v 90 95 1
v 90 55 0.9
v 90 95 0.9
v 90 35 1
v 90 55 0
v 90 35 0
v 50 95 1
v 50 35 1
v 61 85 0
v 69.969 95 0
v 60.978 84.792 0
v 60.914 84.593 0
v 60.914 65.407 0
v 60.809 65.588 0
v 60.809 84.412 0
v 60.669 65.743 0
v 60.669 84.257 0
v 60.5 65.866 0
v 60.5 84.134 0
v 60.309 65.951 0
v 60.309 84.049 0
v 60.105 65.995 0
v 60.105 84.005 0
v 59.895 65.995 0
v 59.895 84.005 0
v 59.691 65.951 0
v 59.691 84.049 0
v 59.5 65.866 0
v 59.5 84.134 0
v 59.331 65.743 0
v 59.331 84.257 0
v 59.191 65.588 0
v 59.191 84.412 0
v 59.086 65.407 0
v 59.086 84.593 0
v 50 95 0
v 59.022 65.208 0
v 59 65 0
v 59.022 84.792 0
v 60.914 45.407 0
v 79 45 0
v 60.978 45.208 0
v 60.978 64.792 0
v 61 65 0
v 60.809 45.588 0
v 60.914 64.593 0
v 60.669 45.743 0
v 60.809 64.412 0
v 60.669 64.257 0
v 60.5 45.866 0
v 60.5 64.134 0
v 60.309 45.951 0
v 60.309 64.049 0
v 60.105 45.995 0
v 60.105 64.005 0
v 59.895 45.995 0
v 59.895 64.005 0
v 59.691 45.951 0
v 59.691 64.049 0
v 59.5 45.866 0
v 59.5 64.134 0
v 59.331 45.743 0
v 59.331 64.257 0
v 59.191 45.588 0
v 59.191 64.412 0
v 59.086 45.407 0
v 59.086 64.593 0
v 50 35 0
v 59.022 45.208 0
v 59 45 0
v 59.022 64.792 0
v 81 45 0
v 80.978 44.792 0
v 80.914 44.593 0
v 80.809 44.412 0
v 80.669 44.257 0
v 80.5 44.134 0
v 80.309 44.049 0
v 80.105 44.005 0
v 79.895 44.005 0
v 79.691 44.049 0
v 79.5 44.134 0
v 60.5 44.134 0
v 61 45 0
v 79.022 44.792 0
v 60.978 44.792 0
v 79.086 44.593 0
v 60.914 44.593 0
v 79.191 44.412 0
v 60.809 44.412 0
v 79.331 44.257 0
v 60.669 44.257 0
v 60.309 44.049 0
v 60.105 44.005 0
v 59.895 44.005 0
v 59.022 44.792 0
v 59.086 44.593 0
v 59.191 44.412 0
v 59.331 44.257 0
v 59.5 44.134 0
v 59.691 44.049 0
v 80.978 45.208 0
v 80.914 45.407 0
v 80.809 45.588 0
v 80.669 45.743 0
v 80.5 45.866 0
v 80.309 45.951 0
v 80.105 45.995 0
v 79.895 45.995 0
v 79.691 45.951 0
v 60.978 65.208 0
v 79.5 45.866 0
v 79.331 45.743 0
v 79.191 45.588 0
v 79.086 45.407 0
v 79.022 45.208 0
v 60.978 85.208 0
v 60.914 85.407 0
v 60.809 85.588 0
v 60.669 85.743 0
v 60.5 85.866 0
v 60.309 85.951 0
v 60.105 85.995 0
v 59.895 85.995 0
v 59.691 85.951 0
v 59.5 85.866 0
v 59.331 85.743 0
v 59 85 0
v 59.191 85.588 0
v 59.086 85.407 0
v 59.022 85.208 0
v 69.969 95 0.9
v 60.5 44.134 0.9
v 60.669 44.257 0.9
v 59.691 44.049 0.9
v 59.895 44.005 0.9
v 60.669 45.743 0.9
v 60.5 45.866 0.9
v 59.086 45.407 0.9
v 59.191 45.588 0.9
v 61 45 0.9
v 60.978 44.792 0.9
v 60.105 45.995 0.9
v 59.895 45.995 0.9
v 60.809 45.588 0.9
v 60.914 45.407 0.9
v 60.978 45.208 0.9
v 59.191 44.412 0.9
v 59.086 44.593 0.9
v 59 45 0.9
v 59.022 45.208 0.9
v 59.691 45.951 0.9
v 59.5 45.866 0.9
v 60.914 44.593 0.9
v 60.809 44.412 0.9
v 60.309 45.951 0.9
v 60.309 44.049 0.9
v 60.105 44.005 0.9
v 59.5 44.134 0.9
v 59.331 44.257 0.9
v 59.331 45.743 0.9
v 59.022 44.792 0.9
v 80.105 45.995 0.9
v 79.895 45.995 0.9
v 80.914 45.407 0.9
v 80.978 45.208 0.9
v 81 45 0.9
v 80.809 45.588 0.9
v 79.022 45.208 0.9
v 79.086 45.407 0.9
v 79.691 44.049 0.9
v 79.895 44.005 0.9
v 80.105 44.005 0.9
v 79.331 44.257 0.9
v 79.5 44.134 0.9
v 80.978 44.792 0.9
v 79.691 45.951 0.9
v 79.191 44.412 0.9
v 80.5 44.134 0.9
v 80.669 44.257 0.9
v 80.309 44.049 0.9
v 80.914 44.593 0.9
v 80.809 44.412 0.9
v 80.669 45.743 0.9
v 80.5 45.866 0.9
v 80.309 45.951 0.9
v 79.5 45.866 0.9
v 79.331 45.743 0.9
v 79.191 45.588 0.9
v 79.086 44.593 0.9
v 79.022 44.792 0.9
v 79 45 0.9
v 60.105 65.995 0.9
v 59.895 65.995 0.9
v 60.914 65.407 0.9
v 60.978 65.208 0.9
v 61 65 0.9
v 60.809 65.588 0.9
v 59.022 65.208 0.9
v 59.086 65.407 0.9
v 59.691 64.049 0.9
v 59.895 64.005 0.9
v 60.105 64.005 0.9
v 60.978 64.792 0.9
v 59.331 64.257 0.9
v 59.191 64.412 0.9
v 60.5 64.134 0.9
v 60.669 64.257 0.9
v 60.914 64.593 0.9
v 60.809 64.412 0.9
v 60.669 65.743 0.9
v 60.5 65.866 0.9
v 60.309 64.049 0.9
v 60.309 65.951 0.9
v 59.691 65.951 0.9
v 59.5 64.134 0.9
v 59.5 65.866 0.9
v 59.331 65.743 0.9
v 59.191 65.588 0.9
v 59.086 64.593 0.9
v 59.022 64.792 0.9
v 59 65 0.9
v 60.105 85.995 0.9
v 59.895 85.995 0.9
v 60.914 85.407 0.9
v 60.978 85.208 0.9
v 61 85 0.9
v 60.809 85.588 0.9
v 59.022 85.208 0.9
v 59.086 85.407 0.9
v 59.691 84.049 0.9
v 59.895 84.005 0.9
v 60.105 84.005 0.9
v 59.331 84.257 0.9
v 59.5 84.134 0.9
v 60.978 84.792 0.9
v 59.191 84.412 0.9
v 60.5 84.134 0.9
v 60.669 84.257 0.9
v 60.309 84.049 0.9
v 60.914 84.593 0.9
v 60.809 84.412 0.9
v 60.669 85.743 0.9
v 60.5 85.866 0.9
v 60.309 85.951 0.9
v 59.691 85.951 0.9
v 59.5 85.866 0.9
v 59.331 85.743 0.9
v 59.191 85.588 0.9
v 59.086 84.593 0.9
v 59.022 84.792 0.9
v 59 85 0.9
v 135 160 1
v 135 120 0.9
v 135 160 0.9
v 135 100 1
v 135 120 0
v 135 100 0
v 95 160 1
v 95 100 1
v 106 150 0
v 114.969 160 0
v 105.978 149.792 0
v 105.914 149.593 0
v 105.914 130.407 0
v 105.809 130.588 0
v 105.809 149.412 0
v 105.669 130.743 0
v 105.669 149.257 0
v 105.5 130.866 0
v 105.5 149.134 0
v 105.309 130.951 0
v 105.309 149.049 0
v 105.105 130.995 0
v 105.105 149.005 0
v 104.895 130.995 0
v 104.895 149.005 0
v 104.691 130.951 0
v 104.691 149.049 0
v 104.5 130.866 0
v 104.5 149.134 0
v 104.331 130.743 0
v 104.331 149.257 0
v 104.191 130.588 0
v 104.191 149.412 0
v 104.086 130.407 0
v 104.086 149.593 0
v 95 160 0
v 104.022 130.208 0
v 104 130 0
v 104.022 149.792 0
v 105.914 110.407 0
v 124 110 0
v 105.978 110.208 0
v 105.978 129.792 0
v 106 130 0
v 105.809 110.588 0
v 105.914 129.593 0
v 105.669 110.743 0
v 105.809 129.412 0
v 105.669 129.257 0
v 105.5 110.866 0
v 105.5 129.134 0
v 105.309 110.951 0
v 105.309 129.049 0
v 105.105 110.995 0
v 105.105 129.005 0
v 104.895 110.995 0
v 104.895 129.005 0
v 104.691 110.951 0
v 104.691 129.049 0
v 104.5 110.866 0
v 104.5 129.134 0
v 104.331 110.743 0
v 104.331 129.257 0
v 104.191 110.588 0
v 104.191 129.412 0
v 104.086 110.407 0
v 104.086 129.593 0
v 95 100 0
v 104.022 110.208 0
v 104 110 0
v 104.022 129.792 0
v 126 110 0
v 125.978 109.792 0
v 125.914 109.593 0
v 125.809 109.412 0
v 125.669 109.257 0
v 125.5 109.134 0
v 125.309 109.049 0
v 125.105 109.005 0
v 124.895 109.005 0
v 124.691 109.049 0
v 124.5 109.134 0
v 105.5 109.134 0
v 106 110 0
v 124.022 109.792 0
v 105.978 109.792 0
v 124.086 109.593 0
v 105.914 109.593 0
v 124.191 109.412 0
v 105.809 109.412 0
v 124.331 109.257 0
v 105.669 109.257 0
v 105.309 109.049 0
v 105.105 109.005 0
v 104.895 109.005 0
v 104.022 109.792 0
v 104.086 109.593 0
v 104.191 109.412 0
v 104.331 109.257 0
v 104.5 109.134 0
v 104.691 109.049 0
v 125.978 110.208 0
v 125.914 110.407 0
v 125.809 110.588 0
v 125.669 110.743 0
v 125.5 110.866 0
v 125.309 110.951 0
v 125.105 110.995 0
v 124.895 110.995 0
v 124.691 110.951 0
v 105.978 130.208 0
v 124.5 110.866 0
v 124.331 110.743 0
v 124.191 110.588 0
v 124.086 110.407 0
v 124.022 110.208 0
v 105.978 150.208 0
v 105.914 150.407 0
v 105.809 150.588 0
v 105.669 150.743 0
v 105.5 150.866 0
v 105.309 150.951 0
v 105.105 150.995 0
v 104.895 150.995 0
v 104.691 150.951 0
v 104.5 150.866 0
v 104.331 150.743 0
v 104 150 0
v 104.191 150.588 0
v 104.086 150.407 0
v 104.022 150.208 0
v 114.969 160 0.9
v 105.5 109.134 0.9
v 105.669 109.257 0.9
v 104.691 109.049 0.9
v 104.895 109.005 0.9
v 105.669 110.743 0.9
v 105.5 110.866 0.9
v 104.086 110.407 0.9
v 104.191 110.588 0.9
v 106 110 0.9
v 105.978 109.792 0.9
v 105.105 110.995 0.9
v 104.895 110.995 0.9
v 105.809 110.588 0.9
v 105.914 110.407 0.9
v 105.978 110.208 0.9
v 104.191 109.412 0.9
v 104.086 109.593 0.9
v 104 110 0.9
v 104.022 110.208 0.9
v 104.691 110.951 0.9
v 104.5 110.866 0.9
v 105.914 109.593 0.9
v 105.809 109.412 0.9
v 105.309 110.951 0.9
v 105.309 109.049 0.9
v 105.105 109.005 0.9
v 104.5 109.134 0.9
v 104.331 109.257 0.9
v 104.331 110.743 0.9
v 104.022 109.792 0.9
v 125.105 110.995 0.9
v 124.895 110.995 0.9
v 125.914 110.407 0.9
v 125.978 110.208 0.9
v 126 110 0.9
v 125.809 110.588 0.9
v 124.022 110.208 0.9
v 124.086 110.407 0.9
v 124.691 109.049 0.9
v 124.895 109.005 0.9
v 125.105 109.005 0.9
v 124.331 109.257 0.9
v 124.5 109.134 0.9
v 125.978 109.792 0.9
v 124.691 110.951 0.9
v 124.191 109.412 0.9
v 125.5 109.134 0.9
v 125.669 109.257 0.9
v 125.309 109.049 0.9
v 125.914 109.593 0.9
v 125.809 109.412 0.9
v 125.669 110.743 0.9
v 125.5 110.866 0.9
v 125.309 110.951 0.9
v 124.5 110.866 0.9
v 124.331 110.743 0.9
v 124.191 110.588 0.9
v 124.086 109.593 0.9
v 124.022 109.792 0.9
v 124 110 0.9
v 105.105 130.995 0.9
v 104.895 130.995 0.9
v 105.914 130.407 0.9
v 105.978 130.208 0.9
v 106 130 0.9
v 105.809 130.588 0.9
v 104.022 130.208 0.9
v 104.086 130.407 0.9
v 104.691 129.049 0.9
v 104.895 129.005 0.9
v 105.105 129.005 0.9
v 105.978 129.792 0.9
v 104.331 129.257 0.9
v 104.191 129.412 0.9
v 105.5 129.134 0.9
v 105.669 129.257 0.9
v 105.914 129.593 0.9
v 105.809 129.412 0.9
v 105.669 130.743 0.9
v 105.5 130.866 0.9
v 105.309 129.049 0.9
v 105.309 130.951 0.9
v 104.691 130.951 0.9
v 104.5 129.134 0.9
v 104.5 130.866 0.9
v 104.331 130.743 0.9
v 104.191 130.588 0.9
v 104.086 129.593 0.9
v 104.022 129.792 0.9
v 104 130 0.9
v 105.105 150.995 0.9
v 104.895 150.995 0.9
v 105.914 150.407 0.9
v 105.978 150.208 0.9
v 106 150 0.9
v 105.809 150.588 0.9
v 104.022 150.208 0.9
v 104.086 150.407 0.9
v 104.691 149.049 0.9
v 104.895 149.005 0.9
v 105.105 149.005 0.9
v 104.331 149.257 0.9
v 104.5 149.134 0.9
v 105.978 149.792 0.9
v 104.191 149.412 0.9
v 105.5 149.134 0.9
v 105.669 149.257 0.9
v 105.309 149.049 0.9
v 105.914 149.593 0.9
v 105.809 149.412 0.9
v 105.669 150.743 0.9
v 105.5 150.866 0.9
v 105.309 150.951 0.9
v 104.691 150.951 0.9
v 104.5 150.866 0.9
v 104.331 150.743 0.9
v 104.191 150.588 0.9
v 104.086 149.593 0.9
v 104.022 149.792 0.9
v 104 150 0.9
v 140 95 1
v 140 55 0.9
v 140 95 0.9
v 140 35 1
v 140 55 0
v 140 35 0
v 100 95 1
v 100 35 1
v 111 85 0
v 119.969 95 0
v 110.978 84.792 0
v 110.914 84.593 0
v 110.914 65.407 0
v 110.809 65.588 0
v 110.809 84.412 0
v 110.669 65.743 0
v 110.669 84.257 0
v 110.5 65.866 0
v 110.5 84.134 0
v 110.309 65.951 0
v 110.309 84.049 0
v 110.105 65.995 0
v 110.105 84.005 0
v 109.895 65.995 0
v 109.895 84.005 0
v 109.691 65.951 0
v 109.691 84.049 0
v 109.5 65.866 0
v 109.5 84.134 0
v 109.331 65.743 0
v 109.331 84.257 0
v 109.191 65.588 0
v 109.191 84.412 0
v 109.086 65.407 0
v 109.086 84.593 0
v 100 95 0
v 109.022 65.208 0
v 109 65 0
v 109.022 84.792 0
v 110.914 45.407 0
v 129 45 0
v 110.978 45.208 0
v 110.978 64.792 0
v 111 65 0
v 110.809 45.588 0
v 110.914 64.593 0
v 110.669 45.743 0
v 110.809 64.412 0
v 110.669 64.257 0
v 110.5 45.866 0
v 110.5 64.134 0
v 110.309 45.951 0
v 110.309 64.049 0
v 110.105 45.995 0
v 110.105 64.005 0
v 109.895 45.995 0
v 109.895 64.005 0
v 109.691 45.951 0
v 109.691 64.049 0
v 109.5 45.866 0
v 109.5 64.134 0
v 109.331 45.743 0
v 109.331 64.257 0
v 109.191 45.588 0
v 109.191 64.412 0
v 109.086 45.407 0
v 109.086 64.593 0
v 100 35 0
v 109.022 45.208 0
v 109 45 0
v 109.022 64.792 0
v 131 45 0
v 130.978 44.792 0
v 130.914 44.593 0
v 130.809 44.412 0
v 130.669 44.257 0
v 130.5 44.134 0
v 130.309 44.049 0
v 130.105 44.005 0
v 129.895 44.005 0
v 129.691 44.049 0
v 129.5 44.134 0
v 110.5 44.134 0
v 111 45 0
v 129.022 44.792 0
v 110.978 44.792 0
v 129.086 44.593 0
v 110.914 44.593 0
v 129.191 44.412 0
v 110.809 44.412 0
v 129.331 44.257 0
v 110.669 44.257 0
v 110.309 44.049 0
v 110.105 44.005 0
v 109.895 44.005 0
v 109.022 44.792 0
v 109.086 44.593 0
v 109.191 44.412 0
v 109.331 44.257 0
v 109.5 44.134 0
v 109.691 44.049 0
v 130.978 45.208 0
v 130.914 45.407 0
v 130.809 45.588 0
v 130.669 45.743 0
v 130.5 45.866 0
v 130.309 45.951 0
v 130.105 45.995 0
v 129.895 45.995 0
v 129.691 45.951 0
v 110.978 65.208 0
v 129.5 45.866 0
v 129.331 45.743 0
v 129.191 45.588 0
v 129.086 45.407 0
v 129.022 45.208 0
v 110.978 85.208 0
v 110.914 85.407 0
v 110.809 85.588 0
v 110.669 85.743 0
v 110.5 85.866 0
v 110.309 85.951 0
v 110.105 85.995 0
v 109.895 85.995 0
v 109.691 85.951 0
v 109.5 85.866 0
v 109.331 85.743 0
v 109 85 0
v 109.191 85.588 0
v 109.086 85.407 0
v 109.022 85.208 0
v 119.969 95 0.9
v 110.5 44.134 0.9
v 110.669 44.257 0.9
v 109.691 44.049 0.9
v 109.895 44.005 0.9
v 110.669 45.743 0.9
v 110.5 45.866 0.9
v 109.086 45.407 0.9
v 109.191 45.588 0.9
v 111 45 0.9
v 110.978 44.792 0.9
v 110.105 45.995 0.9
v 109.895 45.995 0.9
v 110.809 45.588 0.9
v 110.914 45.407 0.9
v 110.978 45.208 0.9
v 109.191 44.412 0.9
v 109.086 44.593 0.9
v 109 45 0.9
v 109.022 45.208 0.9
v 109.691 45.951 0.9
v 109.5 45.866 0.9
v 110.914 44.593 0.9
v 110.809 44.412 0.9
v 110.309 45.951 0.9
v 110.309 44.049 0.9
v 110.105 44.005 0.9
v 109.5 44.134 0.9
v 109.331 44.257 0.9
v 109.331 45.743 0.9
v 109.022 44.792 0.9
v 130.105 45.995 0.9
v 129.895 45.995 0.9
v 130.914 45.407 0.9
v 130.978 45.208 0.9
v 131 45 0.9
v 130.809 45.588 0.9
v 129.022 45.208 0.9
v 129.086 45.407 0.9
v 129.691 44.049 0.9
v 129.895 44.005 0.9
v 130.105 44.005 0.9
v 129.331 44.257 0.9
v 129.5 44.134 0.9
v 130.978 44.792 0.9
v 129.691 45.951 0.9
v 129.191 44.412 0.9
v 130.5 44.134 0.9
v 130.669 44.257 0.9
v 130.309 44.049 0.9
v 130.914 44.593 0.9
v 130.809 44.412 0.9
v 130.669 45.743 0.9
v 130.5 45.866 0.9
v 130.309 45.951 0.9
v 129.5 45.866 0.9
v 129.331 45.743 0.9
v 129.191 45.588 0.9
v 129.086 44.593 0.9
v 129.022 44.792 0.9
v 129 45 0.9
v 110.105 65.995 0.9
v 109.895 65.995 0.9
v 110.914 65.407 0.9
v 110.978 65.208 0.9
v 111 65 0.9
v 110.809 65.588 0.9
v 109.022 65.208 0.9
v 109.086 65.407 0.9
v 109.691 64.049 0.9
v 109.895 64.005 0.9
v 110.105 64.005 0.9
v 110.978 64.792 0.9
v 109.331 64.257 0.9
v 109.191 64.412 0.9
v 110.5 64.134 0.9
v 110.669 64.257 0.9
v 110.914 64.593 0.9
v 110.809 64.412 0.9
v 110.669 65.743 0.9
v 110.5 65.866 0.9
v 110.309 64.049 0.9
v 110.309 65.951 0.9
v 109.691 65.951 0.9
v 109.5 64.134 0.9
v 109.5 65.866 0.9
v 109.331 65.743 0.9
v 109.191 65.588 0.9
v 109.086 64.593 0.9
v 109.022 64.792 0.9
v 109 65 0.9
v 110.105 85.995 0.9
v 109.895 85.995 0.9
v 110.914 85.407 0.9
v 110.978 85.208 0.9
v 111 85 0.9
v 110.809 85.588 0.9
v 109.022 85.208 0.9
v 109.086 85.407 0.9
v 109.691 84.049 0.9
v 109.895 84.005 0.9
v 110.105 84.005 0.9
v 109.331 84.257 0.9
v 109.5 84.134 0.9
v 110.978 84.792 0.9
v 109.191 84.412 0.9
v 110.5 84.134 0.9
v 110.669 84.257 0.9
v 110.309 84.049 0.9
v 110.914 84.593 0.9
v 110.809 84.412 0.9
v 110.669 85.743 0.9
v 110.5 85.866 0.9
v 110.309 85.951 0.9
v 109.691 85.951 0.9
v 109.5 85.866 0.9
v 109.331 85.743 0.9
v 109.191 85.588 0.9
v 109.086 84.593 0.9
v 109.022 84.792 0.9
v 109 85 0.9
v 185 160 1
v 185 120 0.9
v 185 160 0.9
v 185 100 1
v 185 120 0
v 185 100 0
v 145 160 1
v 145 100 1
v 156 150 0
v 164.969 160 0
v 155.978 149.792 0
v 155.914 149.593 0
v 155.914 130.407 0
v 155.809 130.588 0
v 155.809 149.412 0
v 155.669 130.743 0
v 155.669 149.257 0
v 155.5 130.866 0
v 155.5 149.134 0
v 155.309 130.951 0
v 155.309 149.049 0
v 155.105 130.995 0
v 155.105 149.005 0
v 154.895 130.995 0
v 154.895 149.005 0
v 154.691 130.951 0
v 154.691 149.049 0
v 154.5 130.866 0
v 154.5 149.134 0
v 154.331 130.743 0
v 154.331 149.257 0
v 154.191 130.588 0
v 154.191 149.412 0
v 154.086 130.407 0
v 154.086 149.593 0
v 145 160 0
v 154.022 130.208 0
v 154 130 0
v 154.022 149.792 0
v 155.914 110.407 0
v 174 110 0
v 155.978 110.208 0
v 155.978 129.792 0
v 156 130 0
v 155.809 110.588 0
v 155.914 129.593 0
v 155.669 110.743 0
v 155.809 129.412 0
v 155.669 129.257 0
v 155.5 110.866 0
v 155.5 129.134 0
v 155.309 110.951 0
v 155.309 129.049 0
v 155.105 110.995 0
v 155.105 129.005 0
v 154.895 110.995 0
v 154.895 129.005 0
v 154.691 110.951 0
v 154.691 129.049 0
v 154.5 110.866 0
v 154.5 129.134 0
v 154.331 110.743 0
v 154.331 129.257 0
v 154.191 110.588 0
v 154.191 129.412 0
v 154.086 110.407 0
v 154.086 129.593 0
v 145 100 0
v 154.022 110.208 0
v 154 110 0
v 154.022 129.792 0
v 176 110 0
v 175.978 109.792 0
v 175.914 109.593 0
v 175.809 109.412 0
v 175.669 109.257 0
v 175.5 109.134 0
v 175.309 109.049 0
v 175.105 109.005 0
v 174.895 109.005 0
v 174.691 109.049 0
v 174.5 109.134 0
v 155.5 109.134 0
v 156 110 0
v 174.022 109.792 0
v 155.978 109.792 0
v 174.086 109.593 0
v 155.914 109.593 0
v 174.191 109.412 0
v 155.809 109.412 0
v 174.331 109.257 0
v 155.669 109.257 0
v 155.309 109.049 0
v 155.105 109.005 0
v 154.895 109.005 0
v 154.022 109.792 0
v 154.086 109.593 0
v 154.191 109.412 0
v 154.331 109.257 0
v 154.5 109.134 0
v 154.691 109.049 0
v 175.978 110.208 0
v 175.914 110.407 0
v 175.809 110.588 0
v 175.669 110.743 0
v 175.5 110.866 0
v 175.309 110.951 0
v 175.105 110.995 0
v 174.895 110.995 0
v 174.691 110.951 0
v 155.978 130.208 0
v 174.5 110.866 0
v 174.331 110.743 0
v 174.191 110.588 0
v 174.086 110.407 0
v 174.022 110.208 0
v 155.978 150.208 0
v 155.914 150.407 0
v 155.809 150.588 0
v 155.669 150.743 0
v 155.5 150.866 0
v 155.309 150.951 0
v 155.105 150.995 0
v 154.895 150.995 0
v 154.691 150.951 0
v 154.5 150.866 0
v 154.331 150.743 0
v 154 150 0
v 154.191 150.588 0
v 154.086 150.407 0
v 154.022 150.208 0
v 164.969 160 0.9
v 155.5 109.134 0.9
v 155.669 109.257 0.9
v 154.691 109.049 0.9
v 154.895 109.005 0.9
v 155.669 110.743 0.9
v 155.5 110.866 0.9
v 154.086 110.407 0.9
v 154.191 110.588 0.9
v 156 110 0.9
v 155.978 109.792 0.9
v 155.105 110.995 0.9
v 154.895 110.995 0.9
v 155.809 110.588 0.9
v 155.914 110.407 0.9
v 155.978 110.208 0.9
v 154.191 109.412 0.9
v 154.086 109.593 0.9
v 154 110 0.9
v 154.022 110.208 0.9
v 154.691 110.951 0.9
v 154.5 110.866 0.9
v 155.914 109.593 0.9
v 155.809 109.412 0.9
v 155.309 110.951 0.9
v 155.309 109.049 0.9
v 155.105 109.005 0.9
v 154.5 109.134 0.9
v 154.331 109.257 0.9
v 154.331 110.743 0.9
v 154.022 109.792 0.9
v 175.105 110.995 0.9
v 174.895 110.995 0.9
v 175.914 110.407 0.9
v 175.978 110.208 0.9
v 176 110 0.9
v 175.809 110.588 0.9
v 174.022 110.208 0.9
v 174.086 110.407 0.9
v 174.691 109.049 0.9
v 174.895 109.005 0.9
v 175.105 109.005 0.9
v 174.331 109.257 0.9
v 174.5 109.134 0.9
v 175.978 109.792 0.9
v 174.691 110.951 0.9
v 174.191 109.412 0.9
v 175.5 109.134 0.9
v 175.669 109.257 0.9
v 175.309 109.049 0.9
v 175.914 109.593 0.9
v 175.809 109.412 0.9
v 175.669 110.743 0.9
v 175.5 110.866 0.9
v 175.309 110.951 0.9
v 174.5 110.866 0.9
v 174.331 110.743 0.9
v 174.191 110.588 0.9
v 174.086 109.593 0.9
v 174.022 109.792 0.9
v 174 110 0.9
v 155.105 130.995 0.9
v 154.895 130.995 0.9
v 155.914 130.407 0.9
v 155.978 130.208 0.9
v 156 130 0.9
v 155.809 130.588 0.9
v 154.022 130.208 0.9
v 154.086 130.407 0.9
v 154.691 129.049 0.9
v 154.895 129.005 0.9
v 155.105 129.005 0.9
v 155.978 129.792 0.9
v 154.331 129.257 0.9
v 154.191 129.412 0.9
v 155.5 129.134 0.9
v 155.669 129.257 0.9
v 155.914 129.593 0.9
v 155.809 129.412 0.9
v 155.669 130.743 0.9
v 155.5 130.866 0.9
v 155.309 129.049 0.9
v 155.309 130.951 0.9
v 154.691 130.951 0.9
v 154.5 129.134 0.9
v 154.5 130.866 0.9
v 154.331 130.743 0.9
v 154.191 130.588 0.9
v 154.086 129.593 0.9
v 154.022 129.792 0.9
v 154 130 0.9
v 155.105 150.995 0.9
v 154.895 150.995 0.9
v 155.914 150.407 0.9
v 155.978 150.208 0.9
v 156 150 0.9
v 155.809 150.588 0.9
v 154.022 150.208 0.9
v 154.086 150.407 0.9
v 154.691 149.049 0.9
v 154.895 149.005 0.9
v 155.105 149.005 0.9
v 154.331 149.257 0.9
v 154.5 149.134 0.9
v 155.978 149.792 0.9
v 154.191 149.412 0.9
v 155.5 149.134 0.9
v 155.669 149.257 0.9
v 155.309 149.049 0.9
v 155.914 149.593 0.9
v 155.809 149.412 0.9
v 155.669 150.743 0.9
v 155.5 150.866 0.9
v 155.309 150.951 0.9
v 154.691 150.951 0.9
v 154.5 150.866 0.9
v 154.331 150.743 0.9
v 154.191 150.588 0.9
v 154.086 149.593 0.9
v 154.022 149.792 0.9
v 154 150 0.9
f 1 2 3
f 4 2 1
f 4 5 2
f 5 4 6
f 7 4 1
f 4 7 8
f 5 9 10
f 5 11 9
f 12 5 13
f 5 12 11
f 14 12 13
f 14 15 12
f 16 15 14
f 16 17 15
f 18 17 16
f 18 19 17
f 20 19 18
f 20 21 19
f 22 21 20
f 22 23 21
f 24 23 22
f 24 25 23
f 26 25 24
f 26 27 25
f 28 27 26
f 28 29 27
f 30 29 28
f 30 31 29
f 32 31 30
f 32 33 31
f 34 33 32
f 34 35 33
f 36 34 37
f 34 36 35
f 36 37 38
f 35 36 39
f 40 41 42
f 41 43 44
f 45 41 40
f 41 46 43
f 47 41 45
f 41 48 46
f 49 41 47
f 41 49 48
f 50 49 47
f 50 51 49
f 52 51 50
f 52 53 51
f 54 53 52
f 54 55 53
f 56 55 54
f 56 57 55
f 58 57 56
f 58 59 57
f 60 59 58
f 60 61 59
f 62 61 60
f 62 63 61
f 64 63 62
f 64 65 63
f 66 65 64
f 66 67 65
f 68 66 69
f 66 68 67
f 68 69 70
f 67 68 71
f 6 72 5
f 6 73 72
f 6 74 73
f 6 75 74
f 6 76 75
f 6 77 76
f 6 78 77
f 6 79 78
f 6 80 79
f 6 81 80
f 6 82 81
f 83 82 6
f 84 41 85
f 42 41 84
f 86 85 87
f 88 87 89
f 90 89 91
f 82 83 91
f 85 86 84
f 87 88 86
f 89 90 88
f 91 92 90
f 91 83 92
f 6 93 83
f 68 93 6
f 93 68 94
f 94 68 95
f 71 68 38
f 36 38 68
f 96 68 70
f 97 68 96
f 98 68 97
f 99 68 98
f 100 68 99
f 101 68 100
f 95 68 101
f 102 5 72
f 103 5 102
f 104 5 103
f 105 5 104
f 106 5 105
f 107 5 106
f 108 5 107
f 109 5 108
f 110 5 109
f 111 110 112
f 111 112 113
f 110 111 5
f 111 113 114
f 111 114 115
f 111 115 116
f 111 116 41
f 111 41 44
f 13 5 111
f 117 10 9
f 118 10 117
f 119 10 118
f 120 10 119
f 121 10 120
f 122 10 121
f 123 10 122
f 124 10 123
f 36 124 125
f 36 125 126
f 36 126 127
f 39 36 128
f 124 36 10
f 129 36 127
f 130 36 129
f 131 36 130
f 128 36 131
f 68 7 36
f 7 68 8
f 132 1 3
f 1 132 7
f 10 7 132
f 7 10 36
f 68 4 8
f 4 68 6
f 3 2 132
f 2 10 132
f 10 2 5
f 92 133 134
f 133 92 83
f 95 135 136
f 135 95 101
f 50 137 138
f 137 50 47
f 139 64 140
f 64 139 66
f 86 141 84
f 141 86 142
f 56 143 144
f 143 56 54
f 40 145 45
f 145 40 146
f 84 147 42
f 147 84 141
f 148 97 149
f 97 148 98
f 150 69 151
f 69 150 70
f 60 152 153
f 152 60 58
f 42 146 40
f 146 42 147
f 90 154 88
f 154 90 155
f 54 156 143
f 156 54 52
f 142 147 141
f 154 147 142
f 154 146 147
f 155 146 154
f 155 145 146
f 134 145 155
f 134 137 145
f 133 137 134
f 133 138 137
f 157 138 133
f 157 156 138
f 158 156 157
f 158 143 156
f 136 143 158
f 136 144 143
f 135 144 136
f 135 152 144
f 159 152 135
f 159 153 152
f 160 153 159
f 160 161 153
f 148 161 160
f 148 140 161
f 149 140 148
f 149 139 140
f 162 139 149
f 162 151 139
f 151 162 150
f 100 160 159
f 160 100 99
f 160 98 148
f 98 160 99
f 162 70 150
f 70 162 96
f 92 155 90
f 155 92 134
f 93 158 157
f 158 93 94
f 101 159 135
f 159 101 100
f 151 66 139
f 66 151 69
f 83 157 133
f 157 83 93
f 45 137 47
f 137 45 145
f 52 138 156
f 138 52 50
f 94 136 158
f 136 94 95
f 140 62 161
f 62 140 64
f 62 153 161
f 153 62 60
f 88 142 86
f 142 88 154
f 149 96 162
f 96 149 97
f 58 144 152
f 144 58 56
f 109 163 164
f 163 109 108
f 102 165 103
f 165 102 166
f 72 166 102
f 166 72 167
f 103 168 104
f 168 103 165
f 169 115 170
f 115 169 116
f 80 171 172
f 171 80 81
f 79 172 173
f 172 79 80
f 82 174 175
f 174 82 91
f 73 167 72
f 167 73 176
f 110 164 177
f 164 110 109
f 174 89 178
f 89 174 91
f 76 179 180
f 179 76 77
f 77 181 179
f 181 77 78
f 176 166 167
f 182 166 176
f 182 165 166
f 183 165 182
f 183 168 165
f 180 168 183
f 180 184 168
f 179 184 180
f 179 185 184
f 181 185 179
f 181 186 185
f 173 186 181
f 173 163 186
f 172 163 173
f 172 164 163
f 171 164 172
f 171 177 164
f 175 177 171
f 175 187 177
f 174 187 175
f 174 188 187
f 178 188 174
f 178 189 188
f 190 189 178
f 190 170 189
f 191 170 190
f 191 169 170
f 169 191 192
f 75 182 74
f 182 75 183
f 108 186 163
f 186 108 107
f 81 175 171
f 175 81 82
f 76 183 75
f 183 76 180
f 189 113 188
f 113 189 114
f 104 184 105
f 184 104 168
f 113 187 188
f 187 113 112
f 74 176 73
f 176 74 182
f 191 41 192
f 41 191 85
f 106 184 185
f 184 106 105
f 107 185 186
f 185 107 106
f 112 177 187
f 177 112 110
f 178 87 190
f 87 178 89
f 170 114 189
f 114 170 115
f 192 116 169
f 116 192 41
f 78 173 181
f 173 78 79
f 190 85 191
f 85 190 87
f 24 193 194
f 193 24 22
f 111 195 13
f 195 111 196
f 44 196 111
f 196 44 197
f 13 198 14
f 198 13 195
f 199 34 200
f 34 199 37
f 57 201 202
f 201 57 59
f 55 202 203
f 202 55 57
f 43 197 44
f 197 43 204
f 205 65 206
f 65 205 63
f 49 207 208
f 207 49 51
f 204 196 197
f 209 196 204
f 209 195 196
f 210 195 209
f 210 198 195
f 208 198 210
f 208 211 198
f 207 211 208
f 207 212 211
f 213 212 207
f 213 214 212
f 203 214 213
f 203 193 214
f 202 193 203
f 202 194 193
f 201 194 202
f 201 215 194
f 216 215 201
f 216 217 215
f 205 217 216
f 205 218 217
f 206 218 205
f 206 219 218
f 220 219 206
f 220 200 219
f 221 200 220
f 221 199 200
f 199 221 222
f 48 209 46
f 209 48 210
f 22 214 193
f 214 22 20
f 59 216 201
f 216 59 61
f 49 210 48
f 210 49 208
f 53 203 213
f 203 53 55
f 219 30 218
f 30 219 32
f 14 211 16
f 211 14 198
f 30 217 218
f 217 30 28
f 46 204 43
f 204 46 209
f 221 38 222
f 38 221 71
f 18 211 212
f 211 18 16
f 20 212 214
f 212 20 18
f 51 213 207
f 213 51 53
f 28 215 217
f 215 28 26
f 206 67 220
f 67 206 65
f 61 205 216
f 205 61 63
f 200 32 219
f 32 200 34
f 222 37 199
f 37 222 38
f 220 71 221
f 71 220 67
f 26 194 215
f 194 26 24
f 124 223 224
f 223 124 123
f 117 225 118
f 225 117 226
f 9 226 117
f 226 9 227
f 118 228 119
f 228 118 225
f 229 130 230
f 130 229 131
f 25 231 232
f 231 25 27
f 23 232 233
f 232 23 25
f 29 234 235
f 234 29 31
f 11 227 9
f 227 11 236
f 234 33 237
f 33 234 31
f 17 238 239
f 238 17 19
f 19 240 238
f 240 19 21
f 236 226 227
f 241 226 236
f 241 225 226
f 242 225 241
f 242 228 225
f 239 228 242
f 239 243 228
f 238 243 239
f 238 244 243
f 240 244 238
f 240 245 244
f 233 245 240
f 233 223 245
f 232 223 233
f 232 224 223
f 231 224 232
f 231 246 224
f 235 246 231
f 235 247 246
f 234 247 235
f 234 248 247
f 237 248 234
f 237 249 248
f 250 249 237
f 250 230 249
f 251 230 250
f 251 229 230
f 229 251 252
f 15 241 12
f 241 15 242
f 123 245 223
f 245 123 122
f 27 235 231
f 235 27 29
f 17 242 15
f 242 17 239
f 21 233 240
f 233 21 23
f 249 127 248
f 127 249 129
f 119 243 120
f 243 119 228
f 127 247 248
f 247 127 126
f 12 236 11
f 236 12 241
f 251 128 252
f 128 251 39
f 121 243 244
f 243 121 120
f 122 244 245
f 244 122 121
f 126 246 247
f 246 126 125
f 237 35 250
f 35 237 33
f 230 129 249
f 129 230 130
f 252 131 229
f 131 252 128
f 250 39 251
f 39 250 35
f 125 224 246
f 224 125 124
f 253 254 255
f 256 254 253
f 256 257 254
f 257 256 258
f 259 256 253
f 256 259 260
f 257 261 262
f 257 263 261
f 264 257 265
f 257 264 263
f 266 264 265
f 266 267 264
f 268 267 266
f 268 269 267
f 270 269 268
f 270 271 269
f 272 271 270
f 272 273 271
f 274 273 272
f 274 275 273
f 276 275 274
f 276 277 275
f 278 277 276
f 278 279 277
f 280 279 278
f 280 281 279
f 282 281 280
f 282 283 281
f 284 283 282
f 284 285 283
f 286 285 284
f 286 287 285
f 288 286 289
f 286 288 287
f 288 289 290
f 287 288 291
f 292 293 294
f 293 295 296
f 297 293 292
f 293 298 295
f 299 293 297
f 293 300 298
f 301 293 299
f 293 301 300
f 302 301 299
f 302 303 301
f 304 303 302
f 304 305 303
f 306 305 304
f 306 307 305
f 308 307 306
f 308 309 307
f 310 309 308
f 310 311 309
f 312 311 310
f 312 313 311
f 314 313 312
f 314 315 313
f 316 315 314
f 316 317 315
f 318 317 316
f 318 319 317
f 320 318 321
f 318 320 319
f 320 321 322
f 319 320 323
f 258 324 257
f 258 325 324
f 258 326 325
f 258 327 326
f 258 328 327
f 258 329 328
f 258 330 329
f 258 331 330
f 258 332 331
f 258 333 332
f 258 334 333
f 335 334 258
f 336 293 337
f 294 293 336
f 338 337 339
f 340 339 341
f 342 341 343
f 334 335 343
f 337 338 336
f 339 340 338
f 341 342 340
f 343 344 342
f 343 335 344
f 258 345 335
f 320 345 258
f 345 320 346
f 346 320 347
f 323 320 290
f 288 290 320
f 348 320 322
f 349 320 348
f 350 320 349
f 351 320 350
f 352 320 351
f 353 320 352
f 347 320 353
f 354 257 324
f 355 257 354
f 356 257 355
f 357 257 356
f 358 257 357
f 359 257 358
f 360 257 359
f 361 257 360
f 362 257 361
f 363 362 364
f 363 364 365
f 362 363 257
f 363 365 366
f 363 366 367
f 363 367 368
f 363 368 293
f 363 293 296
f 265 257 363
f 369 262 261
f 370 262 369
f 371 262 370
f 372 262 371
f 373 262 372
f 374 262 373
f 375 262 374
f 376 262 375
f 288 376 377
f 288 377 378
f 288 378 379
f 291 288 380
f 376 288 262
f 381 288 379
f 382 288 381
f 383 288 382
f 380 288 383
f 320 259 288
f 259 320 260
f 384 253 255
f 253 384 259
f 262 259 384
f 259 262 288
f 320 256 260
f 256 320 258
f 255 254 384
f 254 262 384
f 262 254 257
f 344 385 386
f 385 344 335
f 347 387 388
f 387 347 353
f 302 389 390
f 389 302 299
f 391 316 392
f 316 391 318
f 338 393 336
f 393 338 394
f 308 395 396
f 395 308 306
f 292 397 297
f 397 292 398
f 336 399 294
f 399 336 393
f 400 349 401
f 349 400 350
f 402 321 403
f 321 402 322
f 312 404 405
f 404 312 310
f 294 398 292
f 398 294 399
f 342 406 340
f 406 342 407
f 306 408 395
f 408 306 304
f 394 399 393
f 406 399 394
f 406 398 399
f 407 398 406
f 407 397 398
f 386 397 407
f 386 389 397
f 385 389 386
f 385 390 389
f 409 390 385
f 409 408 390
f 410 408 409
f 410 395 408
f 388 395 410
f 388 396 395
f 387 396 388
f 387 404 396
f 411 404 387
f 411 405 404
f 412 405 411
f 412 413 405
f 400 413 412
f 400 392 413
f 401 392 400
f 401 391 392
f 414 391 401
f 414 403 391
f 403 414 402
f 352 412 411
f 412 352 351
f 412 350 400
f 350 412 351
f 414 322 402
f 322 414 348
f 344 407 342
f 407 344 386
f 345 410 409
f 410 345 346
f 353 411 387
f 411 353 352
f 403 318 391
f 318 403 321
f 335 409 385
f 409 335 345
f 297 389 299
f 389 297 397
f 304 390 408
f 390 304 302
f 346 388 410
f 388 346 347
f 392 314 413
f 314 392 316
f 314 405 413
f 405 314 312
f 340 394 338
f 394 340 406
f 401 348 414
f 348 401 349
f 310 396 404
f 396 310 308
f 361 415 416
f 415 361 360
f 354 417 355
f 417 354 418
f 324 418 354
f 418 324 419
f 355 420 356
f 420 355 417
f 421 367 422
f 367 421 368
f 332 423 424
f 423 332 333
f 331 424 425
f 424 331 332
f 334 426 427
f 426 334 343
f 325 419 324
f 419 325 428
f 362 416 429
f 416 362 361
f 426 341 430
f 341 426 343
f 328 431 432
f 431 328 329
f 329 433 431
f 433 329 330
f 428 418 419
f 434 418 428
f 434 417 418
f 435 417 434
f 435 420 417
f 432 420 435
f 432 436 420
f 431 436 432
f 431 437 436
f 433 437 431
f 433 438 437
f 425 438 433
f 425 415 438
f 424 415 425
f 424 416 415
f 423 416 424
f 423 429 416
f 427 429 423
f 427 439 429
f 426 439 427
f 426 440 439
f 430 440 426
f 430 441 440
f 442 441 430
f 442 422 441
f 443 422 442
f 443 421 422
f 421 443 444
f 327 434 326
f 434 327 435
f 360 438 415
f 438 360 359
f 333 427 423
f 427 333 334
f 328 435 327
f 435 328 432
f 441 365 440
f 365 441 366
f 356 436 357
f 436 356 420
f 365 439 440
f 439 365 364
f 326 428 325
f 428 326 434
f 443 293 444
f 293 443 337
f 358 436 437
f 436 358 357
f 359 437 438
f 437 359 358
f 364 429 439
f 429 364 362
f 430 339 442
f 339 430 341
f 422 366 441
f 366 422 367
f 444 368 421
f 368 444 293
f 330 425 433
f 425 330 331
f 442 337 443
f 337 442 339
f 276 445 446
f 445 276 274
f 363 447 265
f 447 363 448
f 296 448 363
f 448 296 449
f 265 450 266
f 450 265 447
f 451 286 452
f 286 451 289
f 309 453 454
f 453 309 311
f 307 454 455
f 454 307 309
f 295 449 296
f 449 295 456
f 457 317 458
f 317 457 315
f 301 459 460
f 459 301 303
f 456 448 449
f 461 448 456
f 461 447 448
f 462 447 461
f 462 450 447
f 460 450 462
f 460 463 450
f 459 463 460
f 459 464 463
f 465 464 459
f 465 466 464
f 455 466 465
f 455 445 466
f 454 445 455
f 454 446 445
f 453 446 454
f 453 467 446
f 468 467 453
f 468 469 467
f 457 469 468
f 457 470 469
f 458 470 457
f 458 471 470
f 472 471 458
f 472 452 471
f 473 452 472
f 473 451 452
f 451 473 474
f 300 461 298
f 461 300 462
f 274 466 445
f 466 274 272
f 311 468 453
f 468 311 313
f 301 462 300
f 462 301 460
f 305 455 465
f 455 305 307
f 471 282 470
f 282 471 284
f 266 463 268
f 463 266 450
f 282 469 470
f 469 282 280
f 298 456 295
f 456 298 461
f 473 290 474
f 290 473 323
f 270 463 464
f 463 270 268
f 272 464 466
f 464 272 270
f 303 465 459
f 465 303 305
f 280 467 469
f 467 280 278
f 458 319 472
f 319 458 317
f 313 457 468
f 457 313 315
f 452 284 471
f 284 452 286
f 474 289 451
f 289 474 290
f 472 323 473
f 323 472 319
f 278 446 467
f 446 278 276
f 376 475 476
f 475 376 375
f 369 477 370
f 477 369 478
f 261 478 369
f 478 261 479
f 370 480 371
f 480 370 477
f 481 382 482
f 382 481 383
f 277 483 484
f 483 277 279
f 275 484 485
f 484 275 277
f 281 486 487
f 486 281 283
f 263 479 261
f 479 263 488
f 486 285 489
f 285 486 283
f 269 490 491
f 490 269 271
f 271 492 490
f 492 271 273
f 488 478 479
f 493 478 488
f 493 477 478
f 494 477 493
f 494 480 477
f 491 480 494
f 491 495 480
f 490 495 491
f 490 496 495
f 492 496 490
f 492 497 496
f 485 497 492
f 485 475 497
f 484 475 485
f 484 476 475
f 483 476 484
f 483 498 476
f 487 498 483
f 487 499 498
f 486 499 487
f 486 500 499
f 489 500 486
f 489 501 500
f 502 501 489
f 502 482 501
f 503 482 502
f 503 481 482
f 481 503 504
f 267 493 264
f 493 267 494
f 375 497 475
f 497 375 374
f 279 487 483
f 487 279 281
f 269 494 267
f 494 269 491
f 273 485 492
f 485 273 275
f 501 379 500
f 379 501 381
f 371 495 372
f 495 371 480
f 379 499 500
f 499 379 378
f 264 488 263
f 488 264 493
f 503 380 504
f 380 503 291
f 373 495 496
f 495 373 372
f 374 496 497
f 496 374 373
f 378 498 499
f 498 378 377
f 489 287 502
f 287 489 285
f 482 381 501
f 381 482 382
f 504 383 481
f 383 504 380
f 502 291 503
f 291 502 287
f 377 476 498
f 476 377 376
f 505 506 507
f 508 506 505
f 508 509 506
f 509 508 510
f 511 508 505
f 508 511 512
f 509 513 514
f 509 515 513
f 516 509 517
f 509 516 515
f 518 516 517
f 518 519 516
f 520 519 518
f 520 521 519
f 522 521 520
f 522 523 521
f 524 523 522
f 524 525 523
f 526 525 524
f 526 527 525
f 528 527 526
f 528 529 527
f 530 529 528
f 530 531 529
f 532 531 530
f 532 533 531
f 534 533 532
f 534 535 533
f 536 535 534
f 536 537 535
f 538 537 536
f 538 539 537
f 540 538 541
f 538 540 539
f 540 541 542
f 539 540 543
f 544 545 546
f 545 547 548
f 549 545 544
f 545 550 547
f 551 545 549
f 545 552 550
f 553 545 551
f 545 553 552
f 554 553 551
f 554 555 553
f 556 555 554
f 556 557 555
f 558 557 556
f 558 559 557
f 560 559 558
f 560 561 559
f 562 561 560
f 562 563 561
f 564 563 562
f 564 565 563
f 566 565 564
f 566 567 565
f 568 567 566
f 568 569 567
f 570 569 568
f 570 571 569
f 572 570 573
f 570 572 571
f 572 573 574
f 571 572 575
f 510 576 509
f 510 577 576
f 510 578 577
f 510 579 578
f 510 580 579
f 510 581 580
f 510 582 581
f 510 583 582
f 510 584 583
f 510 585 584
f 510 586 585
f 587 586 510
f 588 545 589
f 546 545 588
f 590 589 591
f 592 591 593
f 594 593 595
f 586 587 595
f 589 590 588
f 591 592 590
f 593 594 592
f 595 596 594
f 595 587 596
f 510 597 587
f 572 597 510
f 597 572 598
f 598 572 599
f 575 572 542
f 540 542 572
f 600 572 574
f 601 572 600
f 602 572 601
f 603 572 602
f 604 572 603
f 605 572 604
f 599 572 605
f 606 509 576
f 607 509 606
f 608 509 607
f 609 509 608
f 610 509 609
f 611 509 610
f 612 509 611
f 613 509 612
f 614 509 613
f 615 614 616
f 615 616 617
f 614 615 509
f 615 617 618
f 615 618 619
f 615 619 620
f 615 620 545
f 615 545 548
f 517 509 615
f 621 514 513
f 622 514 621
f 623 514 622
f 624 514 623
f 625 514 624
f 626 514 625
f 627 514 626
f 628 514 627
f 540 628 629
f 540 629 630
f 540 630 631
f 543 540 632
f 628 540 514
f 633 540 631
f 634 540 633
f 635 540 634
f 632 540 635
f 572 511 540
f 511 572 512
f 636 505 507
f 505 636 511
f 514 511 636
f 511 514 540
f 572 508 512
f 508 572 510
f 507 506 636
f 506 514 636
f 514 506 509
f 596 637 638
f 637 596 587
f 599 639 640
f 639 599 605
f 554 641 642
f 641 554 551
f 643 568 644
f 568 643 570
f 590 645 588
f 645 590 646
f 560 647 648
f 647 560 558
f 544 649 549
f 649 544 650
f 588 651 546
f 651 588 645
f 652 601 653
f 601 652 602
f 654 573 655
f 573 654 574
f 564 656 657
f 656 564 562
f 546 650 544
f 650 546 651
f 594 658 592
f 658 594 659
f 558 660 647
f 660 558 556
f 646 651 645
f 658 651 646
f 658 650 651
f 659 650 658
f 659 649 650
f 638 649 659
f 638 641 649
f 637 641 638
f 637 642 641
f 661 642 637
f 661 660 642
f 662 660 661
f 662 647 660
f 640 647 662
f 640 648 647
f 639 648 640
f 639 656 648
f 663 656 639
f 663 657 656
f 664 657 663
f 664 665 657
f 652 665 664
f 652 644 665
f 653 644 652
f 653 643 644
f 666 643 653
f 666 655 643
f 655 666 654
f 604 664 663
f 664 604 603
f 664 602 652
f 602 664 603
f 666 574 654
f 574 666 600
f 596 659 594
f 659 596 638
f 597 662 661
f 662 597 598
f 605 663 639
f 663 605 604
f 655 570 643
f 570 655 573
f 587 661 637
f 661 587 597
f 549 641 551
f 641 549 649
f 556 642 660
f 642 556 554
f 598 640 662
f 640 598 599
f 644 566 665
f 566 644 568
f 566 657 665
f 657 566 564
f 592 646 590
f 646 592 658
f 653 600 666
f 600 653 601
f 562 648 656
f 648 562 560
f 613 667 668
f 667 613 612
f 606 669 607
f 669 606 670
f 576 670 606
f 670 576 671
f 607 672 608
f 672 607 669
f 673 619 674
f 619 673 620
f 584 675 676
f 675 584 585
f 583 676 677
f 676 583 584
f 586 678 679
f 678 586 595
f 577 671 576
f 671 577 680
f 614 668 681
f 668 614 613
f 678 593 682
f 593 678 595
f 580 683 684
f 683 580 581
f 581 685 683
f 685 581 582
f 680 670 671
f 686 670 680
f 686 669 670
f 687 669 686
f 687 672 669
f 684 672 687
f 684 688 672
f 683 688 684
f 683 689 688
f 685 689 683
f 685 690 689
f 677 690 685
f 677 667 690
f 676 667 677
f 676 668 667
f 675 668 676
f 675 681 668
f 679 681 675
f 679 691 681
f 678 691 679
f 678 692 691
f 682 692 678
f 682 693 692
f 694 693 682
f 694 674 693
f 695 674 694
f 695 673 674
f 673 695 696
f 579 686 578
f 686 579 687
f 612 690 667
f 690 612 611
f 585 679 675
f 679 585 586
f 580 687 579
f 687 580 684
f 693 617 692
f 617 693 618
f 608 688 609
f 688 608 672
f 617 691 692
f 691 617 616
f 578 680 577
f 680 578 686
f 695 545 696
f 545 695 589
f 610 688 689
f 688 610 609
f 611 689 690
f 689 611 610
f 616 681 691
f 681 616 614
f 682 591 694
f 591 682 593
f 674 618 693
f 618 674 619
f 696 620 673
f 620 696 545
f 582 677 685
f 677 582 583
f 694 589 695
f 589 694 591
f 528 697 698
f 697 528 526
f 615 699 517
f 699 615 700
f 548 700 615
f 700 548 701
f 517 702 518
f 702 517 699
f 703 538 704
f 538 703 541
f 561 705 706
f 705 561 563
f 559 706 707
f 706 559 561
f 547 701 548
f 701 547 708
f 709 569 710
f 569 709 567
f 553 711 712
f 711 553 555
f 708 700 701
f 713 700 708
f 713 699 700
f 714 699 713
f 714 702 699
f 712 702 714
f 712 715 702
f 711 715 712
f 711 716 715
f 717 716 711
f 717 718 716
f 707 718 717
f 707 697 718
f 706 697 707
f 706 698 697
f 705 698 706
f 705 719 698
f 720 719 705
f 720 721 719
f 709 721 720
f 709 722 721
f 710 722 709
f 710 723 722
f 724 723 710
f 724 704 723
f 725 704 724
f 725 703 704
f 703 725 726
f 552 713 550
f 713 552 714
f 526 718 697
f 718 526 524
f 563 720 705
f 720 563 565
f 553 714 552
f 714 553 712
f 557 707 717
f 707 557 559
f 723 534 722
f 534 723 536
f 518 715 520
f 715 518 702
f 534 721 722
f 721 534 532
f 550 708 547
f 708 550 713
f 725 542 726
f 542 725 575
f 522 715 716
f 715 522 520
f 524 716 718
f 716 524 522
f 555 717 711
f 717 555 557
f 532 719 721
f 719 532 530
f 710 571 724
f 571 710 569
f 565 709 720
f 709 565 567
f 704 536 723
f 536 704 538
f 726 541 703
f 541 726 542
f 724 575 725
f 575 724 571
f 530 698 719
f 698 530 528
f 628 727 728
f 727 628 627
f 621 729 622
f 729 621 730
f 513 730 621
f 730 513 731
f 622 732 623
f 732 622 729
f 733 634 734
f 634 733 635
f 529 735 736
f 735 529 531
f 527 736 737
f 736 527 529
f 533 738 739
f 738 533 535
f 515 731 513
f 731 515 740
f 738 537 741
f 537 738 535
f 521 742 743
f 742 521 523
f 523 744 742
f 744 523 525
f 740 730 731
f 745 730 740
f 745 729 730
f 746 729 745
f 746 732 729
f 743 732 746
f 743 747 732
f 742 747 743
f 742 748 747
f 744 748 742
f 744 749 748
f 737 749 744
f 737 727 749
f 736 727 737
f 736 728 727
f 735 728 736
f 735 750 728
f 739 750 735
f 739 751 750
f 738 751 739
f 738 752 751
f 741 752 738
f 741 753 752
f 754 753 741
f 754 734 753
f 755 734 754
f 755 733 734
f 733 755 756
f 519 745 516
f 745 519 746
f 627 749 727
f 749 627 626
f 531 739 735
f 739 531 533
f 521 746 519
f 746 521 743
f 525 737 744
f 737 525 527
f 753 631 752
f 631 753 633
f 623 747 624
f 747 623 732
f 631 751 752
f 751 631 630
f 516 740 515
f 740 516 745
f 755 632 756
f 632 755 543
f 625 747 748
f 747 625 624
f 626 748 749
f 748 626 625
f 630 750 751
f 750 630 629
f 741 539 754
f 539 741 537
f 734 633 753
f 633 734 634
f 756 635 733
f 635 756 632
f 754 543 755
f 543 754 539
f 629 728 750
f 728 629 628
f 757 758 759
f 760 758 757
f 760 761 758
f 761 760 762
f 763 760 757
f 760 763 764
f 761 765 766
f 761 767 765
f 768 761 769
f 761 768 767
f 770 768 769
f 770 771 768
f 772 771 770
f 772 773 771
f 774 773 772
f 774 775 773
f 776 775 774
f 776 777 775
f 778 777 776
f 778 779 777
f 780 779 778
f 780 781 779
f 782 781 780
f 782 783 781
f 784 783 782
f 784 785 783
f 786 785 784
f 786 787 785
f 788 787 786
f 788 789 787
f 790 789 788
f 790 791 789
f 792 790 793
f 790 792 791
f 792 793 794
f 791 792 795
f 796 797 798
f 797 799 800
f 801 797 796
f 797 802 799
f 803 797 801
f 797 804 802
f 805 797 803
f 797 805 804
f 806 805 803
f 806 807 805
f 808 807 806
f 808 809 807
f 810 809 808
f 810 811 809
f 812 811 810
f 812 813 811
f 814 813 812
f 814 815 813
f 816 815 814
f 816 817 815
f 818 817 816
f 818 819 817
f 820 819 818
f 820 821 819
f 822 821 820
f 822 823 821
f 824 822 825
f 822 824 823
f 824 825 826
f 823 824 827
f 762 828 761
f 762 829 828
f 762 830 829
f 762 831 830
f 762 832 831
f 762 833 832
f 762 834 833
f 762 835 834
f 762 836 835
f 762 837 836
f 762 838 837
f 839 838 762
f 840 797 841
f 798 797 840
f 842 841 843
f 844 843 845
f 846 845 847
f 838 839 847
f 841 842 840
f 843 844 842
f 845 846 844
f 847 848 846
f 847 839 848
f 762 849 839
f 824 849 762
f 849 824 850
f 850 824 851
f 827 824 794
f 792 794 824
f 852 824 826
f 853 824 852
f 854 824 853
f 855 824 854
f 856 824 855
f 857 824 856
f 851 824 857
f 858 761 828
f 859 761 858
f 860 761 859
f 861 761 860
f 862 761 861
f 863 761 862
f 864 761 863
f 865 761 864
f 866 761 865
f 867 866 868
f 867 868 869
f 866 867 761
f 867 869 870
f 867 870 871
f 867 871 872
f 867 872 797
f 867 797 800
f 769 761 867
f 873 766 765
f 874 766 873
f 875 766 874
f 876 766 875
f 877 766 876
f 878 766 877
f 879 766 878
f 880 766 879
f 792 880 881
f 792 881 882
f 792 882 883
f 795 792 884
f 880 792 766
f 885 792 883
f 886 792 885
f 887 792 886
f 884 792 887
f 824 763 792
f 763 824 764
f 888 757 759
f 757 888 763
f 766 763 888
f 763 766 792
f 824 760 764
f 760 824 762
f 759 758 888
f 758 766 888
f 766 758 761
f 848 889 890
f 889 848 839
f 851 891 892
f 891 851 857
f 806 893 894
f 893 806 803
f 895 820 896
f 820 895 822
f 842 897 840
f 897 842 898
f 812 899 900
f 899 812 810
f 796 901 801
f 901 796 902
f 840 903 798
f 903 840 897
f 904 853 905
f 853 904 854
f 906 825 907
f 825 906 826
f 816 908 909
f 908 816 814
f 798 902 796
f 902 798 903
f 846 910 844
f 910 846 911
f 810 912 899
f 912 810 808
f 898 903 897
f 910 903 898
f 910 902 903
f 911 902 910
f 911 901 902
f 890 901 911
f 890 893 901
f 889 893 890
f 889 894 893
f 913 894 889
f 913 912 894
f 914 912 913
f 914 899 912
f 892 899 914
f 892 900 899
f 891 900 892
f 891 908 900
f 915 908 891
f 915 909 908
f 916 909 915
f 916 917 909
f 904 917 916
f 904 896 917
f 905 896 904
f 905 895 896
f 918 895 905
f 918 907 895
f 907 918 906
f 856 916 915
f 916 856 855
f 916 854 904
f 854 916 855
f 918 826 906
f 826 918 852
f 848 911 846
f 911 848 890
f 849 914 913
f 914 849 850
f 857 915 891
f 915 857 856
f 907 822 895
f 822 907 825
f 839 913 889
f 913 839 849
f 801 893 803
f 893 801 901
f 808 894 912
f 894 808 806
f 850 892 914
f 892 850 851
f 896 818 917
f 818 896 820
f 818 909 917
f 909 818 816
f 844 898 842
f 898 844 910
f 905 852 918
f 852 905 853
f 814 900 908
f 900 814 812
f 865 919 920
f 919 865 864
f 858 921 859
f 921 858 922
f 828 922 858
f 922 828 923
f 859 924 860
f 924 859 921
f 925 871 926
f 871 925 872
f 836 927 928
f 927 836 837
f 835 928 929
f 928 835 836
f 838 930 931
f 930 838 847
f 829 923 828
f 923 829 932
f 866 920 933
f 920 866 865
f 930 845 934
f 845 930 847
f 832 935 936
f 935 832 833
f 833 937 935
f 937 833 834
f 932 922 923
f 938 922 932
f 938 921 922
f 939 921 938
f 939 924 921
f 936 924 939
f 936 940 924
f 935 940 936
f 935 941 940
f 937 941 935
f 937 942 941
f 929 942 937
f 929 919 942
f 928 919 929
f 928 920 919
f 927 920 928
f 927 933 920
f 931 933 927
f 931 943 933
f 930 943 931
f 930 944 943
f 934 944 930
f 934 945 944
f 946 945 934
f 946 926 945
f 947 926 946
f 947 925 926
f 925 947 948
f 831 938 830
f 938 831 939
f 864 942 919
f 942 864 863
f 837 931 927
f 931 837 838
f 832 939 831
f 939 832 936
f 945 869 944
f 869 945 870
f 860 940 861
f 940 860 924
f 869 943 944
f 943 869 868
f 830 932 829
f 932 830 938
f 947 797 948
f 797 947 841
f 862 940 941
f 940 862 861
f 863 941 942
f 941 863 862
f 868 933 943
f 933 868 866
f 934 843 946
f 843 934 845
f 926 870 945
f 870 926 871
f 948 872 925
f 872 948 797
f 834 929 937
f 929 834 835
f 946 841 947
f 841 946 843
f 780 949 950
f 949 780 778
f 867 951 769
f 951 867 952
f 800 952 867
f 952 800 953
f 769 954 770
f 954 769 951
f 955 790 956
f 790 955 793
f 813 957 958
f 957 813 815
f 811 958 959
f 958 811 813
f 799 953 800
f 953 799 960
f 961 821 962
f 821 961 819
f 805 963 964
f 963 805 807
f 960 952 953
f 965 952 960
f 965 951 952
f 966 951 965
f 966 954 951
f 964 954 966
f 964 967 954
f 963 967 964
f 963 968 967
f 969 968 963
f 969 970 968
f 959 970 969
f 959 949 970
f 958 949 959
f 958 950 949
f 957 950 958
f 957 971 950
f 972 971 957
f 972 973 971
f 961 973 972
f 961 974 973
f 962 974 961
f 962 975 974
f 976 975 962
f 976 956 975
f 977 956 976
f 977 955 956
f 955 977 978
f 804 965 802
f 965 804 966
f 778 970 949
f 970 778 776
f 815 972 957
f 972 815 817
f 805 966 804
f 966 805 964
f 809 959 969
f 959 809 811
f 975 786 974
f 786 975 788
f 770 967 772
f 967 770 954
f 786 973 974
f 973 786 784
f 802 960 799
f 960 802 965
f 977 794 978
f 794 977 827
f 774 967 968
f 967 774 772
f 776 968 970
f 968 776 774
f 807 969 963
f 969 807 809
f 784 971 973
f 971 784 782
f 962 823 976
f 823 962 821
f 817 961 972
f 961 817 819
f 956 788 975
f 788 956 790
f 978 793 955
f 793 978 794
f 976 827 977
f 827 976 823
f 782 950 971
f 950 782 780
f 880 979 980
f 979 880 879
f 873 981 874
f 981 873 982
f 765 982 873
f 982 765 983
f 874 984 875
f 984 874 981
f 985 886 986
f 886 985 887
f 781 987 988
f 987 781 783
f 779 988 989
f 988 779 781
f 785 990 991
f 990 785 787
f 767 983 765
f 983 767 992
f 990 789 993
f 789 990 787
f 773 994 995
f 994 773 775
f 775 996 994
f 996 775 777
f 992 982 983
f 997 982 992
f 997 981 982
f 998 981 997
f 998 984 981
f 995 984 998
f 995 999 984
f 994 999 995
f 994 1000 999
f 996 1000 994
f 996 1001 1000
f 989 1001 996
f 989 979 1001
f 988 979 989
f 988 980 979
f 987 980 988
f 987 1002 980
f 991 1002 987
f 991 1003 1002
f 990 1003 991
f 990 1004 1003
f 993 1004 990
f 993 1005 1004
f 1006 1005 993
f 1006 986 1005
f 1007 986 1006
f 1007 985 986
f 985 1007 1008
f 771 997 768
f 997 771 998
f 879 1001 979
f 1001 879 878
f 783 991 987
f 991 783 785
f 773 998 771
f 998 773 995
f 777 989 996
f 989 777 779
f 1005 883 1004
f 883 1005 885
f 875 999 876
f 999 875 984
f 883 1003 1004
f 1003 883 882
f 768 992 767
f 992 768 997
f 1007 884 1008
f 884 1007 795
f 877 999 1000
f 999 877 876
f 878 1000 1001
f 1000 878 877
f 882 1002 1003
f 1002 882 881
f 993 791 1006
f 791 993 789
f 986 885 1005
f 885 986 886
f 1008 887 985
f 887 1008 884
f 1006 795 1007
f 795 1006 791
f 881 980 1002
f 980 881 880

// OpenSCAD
// file: ../functions.scad
// PRUSA Mendel  
// Functions used in many files
// GNU GPL v2
// Josef Průša
// josefprusa@me.com
// prusadjs.cz
// http://www.reprap.org/wiki/Prusa_Mendel
// http://github.com/prusajr/PrusaMendel

module nut(d,h,horizontal=true){
cornerdiameter =  (d / 2) / cos (180 / 6);
cylinder(h = h, r = cornerdiameter, $fn = 6);
if(horizontal){
for(i = [1:6]){
	rotate([0,0,60*i]) translate([-cornerdiameter-0.2,0,0]) rotate([0,0,-45]) cube(size = [2,2,h]);
}}
}

// By nophead
module polyhole(d,h) {
    n = max(round(2 * d),3);
    rotate([0,0,180])
        cylinder(h = h, r = (d / 2) / cos (180 / n), $fn = n);
}

module roundcorner(diameter){
	difference(){
		cube(size = [diameter,diameter,99], center = false);
		translate(v = [diameter, diameter, 0]) cylinder(h = 100, r=diameter, center=true);
	}
}
// file: ../metric.scad
// PRUSA Mendel  
// Default metric sizes
// GNU GPL v2
// Josef Průša
// josefprusa@me.com
// prusadjs.cz
// http://www.reprap.org/wiki/Prusa_Mendel
// http://github.com/prusajr/PrusaMendel

// DONT CHANGE THIS FILE! ALTER VALUES IN CONFIGURATION.SCAD INSTEAD

// RODS

threaded_rod_diameter = 8;
threaded_rod_diameter_horizontal = 8;
smooth_bar_diameter = 8;
smooth_bar_diameter_horizontal = 8;

// Nuts and bolts

m8_diameter = 8;
m8_nut_diameter = 14.5;

m4_diameter = 4;
m4_nut_diameter = 7.5;

m3_diameter = 3;
m3_nut_diameter = 5;

// Bushing holder

bushing_core_diameter = smooth_bar_diameter;
bushing_material_thickness = 1;

// Motors

motor_shaft = 5.1;
// file: ../configuration.scad
// PRUSA Mendel  
// Configuration file
// GNU GPL v2
// Josef Průša
// josefprusa@me.com
// prusadjs.cz
// http://www.reprap.org/wiki/Prusa_Mendel
// http://github.com/prusajr/PrusaMendel

// PLEASE SELECT ONE OF THE CONFIGURATIONS BELOW
// BY UN-COMMENTING IT

// Uncomment for metric settings
// METRIC METRIC METRIC METRIC METRIC METRIC METRIC METRIC 

include <metric.scad>;

// Uncomment for imperial settings
// IMPERIAL IMPERIAL IMPERIAL IMPERIAL IMPERIAL IMPERIAL IMPERIAL 

//include <sae.scad>;

//thin_wall = 3;
// LM8UU
//linear = false;

// override settings by customizing below
// CUSTOM CUSTOM CUSTOM CUSTOM CUSTOM CUSTOM CUSTOM CUSTOM CUSTOM

threaded_rod_diameter = 8.2;
threaded_rod_diameter_horizontal = 8.2;
smooth_bar_diameter = 8.3;
smooth_bar_diameter_horizontal = 8.3;

// Nuts and bolts

m8_diameter = 8.3;
m8_nut_diameter = 15;

m4_diameter = 4.2;
m4_nut_diameter = 9;

m3_diameter = 3.3;
m3_nut_diameter = 5.8;

///counted stuff
m3_nut_diameter_bigger = ((m3_nut_diameter  / 2) / cos (180 / 6))*2;

// functions 
include <functions.scad>
// file: ../90.scad
// C. Strang		
// cstrang@????
// funfor.us

include <configuration.scad>;

//h = 14;      //height 14 for normal "thick" parts
h = 6;		// height 6 for "thin" parts

t = 2;		// tab thickness 2 is normal, -1 to remove
o = 0.1;	//  overlap amount for error free STLs


$fn=30;

translate([0, 0, 0]) prism90(h,t,5);
//translate([-3,0,0]) mirror() prism90(h,t,5);

module prism90(th,st,hd)
{
	difference()
	{
		union()
		{
			cube([40,60,th]);
			// slots tabs
			translate([0,7.5,th-o]) cube([7.5,5,st+2*o]);
			translate([12.5,7.5,th-o]) cube([15,5,st+2*o]);
			translate([32.5,7.5,th-o]) cube([7.5,5,st+2*o]);
			translate([7.5,21,th-o]) cube([5,6.5,st+2*o]);
			translate([7.5,32.5,th-o]) cube([5,15,st+2*o]);
			translate([7.5,52.5,th-o]) cube([5,7.5,st+2*o]);

		}
		
		translate([40,20,-o]) rotate([0,0,26.6]) cube([30,50,th+2*o]);
		// holes
		translate([10,10,-o]) cylinder(r=hd/2,h=th+4);
		translate([30,10,-o]) cylinder(r=hd/2,h=th+4);
		translate([10,30,-o]) cylinder(r=hd/2,h=th+4);
		translate([10,50,-o]) cylinder(r=hd/2,h=th+4);
	}

}
// file: heatbed.scad
// F. Beachler, Longevity Software LLC. d.b.a. Terawatt Industries

include <../configuration.scad>;

$fn=50;
height = 200;
width = 200;
depth = 3;

heatbed(height, width, depth);

module heatbed(h = height, w = width, t = depth) {
	color([255, 0, 0]) cube([h, w, t]);
}
// main file
// F. Beachler, Longevity Software LLC. d.b.a. Terawatt Industries

use <heatbed.scad>;
use <../90.scad>;

$fn=50;

% translate([0, 0, -3]) heatbed();
plate1();

module plate1() {
	for (x = [0, 1]) {
		translate([50 + (x*50), 35, 0]) prism90();
		translate([95 + (x*50), 100, 0]) prism90(mirr = true);
	}
}
